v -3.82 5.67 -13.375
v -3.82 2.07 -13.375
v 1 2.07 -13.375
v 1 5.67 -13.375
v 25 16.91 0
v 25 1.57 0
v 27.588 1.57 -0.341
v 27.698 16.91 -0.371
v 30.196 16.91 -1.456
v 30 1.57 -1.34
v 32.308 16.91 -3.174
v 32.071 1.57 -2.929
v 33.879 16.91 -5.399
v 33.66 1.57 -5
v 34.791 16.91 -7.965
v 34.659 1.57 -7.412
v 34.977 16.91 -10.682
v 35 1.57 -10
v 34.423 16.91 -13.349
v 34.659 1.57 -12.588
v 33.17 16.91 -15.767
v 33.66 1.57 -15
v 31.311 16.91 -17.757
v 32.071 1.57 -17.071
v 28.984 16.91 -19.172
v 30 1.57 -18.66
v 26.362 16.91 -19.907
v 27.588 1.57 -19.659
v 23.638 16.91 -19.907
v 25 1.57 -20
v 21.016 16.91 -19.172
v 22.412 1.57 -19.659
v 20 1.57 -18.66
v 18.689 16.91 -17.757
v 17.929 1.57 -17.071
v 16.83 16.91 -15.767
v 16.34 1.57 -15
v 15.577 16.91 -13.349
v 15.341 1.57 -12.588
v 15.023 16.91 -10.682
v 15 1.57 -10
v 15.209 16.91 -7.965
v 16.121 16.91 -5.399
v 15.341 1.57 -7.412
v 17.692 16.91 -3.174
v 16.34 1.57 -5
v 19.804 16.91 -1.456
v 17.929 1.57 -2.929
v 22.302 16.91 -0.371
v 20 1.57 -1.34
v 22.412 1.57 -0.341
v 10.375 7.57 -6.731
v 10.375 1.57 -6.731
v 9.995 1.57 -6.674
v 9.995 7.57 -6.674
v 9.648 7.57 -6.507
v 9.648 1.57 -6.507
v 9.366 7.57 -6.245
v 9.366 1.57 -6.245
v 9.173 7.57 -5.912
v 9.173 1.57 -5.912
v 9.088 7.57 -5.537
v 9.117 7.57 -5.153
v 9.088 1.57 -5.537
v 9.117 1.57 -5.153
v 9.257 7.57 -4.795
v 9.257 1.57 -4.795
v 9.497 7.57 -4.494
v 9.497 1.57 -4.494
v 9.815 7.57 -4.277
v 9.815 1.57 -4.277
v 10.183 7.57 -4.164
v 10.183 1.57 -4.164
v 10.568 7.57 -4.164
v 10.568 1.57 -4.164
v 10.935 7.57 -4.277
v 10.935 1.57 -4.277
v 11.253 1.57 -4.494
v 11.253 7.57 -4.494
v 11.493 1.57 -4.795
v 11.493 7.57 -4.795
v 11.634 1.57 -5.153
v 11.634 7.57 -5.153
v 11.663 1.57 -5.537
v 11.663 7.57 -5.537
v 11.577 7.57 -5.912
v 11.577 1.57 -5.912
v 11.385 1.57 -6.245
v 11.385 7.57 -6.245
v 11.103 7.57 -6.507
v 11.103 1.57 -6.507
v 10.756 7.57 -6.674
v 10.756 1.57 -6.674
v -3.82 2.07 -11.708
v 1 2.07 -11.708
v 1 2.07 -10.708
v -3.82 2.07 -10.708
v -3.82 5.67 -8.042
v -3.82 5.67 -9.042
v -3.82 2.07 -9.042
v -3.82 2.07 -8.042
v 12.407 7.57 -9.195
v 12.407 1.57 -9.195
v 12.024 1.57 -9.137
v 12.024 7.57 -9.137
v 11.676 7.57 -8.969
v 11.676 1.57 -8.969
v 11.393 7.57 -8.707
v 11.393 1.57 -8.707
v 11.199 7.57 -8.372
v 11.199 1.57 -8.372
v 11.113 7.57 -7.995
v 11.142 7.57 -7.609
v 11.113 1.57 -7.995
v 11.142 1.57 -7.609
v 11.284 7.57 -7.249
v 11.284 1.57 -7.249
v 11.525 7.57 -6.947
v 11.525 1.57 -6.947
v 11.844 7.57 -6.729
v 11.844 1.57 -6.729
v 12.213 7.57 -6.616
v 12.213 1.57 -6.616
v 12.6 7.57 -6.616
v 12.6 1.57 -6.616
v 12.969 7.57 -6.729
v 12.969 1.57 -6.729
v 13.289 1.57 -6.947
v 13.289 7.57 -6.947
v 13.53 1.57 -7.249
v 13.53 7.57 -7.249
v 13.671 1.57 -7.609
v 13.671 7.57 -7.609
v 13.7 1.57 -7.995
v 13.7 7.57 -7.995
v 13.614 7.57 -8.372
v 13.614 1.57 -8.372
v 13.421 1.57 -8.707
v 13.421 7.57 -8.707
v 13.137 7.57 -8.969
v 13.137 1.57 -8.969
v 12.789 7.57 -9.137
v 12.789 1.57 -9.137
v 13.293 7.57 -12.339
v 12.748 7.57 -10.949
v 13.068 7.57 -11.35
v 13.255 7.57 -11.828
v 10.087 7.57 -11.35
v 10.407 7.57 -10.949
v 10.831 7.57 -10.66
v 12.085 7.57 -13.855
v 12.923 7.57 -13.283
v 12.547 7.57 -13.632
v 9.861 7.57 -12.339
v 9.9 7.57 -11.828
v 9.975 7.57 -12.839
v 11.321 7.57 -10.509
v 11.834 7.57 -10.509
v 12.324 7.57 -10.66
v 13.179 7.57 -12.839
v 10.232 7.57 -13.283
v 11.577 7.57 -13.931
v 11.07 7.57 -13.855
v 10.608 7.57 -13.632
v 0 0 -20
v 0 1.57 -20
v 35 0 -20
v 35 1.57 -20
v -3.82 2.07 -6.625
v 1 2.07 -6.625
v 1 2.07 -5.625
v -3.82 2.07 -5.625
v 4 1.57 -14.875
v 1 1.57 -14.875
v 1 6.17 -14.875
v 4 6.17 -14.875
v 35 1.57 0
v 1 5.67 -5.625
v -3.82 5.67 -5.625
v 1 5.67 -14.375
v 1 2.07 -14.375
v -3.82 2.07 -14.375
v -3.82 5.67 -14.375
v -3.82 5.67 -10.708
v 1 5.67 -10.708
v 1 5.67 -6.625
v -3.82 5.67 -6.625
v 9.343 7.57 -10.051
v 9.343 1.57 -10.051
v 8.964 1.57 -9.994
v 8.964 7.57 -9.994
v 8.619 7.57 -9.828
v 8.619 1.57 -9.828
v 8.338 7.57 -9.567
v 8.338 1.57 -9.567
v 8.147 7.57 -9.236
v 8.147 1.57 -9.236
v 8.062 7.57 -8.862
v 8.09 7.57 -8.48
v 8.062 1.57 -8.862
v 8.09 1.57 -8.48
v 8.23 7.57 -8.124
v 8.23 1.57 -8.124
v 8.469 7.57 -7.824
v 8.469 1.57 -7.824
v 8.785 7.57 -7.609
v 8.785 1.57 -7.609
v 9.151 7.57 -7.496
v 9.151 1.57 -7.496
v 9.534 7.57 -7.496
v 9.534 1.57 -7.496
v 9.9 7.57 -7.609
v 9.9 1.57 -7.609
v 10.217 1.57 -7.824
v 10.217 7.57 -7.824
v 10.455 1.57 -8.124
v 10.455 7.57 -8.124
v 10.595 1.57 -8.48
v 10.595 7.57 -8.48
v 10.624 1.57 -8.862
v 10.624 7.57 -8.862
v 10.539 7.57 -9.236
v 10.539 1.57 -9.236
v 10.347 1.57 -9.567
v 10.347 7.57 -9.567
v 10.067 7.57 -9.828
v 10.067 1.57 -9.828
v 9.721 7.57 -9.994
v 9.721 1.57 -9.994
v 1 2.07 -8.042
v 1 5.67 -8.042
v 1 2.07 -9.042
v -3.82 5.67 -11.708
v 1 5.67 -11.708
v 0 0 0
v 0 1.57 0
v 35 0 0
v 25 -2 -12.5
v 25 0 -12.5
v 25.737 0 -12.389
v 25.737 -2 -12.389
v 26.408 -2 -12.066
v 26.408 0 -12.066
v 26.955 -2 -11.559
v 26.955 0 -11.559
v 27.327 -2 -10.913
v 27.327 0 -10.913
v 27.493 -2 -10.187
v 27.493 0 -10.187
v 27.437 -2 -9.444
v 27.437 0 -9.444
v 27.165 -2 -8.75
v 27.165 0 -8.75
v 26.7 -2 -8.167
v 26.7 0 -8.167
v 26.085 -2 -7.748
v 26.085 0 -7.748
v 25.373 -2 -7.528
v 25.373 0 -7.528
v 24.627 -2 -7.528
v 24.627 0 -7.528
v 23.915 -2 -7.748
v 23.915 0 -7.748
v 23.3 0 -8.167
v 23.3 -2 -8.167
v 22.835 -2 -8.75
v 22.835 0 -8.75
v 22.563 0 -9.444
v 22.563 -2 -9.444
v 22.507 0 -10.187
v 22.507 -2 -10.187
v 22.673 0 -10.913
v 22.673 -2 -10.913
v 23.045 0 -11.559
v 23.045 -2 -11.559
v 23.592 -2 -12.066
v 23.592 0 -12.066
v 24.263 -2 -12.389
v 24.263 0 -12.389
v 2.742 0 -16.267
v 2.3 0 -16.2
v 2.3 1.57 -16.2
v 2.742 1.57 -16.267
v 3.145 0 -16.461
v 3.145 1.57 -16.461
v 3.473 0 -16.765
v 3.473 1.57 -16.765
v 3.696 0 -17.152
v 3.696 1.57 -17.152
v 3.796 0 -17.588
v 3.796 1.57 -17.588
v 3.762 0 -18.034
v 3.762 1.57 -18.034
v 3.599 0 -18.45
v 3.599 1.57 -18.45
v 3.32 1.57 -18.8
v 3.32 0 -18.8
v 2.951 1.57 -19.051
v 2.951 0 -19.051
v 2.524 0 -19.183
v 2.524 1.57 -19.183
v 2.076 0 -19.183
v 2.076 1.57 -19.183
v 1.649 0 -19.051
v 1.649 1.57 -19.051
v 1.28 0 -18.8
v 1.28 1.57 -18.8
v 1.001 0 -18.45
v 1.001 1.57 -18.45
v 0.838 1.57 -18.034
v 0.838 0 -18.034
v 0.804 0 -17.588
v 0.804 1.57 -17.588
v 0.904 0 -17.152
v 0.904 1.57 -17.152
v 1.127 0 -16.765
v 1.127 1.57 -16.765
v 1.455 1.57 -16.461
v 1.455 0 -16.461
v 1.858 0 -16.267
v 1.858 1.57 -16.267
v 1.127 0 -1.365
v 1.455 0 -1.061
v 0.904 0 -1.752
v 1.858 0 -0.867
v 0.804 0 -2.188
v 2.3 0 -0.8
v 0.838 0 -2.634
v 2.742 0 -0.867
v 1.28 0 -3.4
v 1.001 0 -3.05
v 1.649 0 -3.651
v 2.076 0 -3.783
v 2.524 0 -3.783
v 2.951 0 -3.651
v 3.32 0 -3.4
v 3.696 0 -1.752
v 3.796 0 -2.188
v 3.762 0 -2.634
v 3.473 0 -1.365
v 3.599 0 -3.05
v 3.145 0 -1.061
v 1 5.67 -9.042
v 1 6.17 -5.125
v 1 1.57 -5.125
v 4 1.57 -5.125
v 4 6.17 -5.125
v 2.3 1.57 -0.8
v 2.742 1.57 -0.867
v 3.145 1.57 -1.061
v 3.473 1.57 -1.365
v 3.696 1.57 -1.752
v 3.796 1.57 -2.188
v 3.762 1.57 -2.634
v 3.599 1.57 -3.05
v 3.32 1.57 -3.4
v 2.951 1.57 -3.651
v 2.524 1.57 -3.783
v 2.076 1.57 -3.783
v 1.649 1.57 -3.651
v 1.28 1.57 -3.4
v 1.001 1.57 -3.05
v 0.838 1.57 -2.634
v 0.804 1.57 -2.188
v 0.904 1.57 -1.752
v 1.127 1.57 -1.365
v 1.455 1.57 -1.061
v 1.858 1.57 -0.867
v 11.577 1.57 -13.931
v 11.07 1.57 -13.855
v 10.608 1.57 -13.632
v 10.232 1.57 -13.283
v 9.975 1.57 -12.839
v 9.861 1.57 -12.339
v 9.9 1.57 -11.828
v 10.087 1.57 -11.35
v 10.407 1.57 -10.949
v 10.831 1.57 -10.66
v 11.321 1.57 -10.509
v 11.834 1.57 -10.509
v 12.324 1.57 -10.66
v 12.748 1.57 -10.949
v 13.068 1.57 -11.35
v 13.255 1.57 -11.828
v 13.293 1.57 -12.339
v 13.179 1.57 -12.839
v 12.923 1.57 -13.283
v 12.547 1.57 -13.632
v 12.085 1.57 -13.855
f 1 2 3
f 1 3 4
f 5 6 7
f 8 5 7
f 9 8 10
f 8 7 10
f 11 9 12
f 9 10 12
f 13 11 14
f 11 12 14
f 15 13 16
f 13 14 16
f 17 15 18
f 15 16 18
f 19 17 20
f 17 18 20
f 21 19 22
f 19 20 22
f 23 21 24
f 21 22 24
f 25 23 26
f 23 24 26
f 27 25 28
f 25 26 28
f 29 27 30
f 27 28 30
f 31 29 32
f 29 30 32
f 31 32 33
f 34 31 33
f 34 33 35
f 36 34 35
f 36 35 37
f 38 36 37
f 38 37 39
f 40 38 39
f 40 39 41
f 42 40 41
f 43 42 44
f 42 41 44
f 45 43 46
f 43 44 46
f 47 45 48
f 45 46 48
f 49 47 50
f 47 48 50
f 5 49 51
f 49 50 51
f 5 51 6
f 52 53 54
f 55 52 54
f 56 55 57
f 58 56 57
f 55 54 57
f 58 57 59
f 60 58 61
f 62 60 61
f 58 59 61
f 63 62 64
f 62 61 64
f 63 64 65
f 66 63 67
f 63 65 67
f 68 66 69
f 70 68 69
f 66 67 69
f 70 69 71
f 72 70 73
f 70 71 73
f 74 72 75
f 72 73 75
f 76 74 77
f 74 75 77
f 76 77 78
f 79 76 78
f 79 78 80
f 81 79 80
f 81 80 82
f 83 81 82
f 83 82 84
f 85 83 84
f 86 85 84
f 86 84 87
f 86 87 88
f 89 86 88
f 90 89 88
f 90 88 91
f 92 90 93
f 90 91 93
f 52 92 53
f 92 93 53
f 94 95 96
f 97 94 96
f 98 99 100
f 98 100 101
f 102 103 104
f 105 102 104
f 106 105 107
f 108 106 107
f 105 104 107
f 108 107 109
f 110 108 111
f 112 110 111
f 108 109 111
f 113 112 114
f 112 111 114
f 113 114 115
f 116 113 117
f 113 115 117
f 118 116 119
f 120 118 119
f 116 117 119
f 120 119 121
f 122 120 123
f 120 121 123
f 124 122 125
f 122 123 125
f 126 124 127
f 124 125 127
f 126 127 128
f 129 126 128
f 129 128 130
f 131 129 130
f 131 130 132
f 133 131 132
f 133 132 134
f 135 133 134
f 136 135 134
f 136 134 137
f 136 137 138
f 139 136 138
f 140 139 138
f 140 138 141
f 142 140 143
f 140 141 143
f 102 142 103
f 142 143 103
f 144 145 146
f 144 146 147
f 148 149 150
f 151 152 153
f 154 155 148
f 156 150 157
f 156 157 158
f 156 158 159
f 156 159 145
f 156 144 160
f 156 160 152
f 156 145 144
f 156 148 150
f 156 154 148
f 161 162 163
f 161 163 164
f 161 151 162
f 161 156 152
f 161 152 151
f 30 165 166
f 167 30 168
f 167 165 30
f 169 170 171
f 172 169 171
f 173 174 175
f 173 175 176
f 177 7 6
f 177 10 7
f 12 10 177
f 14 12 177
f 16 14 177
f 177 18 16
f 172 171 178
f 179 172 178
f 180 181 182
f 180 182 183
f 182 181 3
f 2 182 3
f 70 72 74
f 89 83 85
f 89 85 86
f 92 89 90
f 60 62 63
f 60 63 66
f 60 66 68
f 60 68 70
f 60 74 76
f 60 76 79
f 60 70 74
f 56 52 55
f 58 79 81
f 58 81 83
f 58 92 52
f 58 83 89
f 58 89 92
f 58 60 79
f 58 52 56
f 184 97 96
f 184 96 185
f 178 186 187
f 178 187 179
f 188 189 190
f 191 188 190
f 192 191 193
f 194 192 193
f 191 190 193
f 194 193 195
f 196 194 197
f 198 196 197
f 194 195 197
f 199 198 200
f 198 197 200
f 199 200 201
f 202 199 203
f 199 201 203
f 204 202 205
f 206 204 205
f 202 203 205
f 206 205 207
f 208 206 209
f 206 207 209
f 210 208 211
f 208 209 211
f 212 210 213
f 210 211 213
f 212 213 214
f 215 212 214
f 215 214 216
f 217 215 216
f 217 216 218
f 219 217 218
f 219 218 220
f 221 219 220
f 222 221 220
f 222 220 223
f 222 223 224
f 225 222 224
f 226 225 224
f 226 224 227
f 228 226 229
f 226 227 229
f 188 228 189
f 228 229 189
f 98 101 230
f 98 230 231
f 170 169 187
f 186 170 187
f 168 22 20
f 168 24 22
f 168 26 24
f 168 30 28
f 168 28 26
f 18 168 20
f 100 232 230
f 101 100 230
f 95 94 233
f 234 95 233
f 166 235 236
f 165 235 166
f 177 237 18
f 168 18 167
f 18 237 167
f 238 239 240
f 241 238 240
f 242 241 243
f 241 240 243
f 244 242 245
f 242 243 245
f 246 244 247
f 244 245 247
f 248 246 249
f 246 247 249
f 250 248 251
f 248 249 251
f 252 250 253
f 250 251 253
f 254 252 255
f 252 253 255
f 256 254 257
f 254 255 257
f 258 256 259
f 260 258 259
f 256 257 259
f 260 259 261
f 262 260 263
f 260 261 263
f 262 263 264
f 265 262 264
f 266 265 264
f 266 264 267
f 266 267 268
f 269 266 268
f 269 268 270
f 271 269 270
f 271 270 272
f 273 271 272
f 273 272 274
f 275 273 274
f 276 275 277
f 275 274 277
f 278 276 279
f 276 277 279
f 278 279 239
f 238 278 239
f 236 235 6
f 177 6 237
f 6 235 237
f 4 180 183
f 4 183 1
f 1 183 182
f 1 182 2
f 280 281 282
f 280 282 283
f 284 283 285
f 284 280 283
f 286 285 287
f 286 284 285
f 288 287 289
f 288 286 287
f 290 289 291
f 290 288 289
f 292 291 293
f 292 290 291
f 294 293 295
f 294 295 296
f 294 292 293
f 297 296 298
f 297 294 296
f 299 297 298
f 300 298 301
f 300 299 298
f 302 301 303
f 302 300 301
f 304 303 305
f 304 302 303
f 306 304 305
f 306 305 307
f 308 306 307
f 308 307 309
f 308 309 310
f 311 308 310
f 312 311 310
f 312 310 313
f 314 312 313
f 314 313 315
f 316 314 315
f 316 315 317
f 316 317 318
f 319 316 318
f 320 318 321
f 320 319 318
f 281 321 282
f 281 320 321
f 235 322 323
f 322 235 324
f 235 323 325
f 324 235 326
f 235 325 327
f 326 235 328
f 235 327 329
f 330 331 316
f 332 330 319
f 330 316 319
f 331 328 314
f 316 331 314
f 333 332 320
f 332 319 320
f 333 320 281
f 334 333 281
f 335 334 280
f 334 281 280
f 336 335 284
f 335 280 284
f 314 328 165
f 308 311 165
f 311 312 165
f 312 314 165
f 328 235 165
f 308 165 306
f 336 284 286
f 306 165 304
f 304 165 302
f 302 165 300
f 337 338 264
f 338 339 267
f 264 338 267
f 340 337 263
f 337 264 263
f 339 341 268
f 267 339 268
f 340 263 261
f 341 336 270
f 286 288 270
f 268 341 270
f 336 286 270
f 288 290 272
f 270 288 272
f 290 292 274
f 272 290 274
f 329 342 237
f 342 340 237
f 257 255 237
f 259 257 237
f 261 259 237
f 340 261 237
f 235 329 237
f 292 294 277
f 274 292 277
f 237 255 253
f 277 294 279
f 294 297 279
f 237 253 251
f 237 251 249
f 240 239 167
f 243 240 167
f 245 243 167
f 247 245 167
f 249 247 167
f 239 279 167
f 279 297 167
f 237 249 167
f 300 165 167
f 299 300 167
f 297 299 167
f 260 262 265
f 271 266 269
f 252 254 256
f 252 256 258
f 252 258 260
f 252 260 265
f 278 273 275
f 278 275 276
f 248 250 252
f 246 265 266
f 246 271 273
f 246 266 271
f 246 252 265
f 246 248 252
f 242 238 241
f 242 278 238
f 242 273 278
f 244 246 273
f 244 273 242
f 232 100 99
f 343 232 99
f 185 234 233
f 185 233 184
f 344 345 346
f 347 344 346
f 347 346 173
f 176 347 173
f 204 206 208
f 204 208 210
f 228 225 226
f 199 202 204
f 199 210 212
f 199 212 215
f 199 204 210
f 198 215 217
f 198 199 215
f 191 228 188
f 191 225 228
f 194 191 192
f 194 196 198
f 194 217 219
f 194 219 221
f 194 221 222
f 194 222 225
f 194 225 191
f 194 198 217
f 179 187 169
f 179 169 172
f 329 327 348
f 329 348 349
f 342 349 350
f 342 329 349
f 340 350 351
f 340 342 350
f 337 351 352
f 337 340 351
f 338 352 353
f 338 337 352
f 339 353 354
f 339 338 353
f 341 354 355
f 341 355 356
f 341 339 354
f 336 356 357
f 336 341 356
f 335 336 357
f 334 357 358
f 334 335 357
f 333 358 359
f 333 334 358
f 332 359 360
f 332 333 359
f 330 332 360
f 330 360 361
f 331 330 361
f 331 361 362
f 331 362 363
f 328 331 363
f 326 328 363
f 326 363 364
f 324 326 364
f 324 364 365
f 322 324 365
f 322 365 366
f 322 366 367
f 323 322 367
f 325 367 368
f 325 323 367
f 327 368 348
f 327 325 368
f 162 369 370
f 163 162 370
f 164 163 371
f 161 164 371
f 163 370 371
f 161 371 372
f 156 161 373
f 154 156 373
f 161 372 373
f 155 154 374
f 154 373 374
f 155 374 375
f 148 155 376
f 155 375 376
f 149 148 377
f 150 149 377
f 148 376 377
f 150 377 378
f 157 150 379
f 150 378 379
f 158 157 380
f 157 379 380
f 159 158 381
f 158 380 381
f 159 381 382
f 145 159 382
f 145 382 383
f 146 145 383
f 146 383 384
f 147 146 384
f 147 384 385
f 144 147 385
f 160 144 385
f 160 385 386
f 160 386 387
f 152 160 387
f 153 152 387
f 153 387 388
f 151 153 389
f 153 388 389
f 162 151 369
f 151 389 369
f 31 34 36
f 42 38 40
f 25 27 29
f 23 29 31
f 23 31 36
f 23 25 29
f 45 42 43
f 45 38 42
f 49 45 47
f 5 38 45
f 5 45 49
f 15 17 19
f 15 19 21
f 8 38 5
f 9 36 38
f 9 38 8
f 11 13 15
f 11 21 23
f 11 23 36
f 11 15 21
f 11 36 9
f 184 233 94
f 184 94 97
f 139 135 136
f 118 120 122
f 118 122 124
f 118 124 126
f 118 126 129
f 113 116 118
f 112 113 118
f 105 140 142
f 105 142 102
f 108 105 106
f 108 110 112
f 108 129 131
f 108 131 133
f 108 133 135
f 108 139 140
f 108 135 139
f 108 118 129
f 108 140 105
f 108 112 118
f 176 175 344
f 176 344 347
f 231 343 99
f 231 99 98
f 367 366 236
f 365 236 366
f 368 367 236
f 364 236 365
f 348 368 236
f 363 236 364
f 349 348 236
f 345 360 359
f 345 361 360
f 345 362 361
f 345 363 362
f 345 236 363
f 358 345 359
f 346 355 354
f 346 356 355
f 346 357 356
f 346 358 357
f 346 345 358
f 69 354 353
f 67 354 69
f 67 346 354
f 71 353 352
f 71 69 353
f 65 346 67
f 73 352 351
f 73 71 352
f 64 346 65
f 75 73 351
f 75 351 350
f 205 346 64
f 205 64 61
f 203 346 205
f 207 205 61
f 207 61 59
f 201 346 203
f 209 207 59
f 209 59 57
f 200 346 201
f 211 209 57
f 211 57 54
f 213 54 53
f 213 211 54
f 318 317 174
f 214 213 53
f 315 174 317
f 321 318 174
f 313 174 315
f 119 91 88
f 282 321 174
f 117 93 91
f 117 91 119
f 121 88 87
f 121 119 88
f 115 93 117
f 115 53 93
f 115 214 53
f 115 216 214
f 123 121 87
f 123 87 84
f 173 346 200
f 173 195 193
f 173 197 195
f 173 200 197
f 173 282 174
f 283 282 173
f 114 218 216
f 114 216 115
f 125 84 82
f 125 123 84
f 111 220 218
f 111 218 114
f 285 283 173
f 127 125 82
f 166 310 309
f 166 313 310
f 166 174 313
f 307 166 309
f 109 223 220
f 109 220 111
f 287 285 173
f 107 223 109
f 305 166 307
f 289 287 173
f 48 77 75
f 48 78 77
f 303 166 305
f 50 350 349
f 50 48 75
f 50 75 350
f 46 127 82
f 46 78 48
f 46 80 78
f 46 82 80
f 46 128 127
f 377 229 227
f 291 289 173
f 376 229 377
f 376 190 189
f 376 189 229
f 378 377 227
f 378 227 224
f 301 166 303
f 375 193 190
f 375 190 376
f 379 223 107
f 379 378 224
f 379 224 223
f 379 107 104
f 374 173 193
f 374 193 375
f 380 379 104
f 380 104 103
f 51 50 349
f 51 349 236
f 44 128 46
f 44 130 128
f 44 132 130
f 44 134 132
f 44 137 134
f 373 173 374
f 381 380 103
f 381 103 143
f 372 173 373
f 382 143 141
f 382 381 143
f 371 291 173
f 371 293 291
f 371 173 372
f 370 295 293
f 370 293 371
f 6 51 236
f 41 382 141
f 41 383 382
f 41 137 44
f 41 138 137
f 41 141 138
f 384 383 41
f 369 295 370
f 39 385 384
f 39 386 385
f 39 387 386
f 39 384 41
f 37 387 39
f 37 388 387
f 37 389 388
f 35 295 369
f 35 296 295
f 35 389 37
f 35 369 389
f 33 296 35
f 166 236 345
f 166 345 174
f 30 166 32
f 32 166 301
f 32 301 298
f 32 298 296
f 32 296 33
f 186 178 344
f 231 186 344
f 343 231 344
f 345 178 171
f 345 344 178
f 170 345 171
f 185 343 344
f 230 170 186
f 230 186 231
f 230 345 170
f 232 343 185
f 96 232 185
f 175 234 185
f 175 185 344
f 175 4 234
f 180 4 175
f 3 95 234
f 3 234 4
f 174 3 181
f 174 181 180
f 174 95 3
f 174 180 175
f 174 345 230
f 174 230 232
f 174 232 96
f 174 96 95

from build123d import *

# Parameters (mm, degrees)
SKETCH1_W           = 35
SKETCH1_H           = 20
SKETCH1_R           = 1.5
BOSS_EXTRUDE1_DEPTH = 1.57
SKETCH2_R           = 10
BOSS_EXTRUDE2_DEPTH = 15.34
SKETCH3_W           = 3
SKETCH3_H           = 9.75
BOSS_EXTRUDE3_DEPTH = 4.6
SKETCH4_W           = 8.75
SKETCH4_H           = 3.6
BOSS_EXTRUDE4_DEPTH = 4.82
SKETCH5_W           = 1.666666667
SKETCH5_H           = 3.6
SKETCH5_W_2         = 1.666666666
SKETCH5_W_3         = 1.416666667
CUT_EXTRUDE1_DEPTH  = 4.82
SKETCH6_R           = 1.29689407
SKETCH6_R_2         = 1.720847255
SKETCH6_R_3         = 1.291006222
SKETCH6_R_4         = 1.284790683
BOSS_EXTRUDE5_DEPTH = 6
SKETCH7_R           = 2.5
BOSS_EXTRUDE6_DEPTH = 2


with BuildPart() as part:
    # Sketch1 → Boss-Extrude1 (new body)
    with BuildSketch(Plane(origin=(0, 0, 0), x_dir=(1, 0, 0), z_dir=(0, 1, 0))):
        with Locations((17.5, 10)):
            Rectangle(SKETCH1_W, SKETCH1_H)
        with Locations(Location((2.3, 17.7, 0), (0, 0, 270))):
            Circle(SKETCH1_R, mode=Mode.SUBTRACT)
        with Locations(Location((2.3, 2.3, 0), (0, 0, 270))):
            Circle(SKETCH1_R, mode=Mode.SUBTRACT)
    extrude(amount=BOSS_EXTRUDE1_DEPTH)

    # Sketch2 → Boss-Extrude2 (add)
    with BuildSketch(Plane(origin=(0, 1.57, 0), x_dir=(1, 0, 0), z_dir=(0, 1, 0))):
        with Locations(Location((25, 10, 0), (0, 0, 270))):
            Circle(SKETCH2_R)
    extrude(amount=BOSS_EXTRUDE2_DEPTH)

    # Sketch3 → Boss-Extrude3 (add)
    with BuildSketch(Plane(origin=(0, 1.57, 0), x_dir=(1, 0, 0), z_dir=(0, 1, 0))):
        with Locations((2.5, 10)):
            Rectangle(SKETCH3_W, SKETCH3_H)
    extrude(amount=BOSS_EXTRUDE3_DEPTH)

    # Sketch4 → Boss-Extrude4 (add)
    with BuildSketch(Plane.ZY.offset(-1)):
        with Locations((-10, 3.87)):
            Rectangle(SKETCH4_W, SKETCH4_H)
    extrude(amount=BOSS_EXTRUDE4_DEPTH)

    # Sketch5 → Cut-Extrude1 (cut)
    with BuildSketch(Plane.ZY.offset(3.82)):
        with Locations((-12.541666666, 3.87)):
            Rectangle(SKETCH5_W, SKETCH5_H)
        with Locations((-9.875, 3.87)):
            Rectangle(SKETCH5_W_2, SKETCH5_H)
        with Locations((-7.333333334, 3.87)):
            Rectangle(SKETCH5_W_3, SKETCH5_H)
    extrude(amount=-CUT_EXTRUDE1_DEPTH, mode=Mode.SUBTRACT)

    # Sketch6 → Boss-Extrude5 (add)
    with BuildSketch(Plane(origin=(0, 1.57, 0), x_dir=(1, 0, 0), z_dir=(0, 1, 0))):
        with Locations(Location((12.406689858, 7.897918268, 0), (0, 0, 90))):
            Circle(SKETCH6_R)
        with Locations(Location((11.577372326, 12.210536894, 0), (0, 0, 90))):
            Circle(SKETCH6_R_2)
        with Locations(Location((10.375255256, 5.440145452, 0), (0, 0, 90))):
            Circle(SKETCH6_R_3)
        with Locations(Location((9.342761815, 8.766255662, 0), (0, 0, 90))):
            Circle(SKETCH6_R_4)
    extrude(amount=BOSS_EXTRUDE5_DEPTH)

    # Sketch7 → Boss-Extrude6 (add)
    with BuildSketch(Plane.XZ):
        with Locations(Location((25, -10, 0), (0, 0, 270))):
            Circle(SKETCH7_R)
    extrude(amount=BOSS_EXTRUDE6_DEPTH)


solid = part.part
